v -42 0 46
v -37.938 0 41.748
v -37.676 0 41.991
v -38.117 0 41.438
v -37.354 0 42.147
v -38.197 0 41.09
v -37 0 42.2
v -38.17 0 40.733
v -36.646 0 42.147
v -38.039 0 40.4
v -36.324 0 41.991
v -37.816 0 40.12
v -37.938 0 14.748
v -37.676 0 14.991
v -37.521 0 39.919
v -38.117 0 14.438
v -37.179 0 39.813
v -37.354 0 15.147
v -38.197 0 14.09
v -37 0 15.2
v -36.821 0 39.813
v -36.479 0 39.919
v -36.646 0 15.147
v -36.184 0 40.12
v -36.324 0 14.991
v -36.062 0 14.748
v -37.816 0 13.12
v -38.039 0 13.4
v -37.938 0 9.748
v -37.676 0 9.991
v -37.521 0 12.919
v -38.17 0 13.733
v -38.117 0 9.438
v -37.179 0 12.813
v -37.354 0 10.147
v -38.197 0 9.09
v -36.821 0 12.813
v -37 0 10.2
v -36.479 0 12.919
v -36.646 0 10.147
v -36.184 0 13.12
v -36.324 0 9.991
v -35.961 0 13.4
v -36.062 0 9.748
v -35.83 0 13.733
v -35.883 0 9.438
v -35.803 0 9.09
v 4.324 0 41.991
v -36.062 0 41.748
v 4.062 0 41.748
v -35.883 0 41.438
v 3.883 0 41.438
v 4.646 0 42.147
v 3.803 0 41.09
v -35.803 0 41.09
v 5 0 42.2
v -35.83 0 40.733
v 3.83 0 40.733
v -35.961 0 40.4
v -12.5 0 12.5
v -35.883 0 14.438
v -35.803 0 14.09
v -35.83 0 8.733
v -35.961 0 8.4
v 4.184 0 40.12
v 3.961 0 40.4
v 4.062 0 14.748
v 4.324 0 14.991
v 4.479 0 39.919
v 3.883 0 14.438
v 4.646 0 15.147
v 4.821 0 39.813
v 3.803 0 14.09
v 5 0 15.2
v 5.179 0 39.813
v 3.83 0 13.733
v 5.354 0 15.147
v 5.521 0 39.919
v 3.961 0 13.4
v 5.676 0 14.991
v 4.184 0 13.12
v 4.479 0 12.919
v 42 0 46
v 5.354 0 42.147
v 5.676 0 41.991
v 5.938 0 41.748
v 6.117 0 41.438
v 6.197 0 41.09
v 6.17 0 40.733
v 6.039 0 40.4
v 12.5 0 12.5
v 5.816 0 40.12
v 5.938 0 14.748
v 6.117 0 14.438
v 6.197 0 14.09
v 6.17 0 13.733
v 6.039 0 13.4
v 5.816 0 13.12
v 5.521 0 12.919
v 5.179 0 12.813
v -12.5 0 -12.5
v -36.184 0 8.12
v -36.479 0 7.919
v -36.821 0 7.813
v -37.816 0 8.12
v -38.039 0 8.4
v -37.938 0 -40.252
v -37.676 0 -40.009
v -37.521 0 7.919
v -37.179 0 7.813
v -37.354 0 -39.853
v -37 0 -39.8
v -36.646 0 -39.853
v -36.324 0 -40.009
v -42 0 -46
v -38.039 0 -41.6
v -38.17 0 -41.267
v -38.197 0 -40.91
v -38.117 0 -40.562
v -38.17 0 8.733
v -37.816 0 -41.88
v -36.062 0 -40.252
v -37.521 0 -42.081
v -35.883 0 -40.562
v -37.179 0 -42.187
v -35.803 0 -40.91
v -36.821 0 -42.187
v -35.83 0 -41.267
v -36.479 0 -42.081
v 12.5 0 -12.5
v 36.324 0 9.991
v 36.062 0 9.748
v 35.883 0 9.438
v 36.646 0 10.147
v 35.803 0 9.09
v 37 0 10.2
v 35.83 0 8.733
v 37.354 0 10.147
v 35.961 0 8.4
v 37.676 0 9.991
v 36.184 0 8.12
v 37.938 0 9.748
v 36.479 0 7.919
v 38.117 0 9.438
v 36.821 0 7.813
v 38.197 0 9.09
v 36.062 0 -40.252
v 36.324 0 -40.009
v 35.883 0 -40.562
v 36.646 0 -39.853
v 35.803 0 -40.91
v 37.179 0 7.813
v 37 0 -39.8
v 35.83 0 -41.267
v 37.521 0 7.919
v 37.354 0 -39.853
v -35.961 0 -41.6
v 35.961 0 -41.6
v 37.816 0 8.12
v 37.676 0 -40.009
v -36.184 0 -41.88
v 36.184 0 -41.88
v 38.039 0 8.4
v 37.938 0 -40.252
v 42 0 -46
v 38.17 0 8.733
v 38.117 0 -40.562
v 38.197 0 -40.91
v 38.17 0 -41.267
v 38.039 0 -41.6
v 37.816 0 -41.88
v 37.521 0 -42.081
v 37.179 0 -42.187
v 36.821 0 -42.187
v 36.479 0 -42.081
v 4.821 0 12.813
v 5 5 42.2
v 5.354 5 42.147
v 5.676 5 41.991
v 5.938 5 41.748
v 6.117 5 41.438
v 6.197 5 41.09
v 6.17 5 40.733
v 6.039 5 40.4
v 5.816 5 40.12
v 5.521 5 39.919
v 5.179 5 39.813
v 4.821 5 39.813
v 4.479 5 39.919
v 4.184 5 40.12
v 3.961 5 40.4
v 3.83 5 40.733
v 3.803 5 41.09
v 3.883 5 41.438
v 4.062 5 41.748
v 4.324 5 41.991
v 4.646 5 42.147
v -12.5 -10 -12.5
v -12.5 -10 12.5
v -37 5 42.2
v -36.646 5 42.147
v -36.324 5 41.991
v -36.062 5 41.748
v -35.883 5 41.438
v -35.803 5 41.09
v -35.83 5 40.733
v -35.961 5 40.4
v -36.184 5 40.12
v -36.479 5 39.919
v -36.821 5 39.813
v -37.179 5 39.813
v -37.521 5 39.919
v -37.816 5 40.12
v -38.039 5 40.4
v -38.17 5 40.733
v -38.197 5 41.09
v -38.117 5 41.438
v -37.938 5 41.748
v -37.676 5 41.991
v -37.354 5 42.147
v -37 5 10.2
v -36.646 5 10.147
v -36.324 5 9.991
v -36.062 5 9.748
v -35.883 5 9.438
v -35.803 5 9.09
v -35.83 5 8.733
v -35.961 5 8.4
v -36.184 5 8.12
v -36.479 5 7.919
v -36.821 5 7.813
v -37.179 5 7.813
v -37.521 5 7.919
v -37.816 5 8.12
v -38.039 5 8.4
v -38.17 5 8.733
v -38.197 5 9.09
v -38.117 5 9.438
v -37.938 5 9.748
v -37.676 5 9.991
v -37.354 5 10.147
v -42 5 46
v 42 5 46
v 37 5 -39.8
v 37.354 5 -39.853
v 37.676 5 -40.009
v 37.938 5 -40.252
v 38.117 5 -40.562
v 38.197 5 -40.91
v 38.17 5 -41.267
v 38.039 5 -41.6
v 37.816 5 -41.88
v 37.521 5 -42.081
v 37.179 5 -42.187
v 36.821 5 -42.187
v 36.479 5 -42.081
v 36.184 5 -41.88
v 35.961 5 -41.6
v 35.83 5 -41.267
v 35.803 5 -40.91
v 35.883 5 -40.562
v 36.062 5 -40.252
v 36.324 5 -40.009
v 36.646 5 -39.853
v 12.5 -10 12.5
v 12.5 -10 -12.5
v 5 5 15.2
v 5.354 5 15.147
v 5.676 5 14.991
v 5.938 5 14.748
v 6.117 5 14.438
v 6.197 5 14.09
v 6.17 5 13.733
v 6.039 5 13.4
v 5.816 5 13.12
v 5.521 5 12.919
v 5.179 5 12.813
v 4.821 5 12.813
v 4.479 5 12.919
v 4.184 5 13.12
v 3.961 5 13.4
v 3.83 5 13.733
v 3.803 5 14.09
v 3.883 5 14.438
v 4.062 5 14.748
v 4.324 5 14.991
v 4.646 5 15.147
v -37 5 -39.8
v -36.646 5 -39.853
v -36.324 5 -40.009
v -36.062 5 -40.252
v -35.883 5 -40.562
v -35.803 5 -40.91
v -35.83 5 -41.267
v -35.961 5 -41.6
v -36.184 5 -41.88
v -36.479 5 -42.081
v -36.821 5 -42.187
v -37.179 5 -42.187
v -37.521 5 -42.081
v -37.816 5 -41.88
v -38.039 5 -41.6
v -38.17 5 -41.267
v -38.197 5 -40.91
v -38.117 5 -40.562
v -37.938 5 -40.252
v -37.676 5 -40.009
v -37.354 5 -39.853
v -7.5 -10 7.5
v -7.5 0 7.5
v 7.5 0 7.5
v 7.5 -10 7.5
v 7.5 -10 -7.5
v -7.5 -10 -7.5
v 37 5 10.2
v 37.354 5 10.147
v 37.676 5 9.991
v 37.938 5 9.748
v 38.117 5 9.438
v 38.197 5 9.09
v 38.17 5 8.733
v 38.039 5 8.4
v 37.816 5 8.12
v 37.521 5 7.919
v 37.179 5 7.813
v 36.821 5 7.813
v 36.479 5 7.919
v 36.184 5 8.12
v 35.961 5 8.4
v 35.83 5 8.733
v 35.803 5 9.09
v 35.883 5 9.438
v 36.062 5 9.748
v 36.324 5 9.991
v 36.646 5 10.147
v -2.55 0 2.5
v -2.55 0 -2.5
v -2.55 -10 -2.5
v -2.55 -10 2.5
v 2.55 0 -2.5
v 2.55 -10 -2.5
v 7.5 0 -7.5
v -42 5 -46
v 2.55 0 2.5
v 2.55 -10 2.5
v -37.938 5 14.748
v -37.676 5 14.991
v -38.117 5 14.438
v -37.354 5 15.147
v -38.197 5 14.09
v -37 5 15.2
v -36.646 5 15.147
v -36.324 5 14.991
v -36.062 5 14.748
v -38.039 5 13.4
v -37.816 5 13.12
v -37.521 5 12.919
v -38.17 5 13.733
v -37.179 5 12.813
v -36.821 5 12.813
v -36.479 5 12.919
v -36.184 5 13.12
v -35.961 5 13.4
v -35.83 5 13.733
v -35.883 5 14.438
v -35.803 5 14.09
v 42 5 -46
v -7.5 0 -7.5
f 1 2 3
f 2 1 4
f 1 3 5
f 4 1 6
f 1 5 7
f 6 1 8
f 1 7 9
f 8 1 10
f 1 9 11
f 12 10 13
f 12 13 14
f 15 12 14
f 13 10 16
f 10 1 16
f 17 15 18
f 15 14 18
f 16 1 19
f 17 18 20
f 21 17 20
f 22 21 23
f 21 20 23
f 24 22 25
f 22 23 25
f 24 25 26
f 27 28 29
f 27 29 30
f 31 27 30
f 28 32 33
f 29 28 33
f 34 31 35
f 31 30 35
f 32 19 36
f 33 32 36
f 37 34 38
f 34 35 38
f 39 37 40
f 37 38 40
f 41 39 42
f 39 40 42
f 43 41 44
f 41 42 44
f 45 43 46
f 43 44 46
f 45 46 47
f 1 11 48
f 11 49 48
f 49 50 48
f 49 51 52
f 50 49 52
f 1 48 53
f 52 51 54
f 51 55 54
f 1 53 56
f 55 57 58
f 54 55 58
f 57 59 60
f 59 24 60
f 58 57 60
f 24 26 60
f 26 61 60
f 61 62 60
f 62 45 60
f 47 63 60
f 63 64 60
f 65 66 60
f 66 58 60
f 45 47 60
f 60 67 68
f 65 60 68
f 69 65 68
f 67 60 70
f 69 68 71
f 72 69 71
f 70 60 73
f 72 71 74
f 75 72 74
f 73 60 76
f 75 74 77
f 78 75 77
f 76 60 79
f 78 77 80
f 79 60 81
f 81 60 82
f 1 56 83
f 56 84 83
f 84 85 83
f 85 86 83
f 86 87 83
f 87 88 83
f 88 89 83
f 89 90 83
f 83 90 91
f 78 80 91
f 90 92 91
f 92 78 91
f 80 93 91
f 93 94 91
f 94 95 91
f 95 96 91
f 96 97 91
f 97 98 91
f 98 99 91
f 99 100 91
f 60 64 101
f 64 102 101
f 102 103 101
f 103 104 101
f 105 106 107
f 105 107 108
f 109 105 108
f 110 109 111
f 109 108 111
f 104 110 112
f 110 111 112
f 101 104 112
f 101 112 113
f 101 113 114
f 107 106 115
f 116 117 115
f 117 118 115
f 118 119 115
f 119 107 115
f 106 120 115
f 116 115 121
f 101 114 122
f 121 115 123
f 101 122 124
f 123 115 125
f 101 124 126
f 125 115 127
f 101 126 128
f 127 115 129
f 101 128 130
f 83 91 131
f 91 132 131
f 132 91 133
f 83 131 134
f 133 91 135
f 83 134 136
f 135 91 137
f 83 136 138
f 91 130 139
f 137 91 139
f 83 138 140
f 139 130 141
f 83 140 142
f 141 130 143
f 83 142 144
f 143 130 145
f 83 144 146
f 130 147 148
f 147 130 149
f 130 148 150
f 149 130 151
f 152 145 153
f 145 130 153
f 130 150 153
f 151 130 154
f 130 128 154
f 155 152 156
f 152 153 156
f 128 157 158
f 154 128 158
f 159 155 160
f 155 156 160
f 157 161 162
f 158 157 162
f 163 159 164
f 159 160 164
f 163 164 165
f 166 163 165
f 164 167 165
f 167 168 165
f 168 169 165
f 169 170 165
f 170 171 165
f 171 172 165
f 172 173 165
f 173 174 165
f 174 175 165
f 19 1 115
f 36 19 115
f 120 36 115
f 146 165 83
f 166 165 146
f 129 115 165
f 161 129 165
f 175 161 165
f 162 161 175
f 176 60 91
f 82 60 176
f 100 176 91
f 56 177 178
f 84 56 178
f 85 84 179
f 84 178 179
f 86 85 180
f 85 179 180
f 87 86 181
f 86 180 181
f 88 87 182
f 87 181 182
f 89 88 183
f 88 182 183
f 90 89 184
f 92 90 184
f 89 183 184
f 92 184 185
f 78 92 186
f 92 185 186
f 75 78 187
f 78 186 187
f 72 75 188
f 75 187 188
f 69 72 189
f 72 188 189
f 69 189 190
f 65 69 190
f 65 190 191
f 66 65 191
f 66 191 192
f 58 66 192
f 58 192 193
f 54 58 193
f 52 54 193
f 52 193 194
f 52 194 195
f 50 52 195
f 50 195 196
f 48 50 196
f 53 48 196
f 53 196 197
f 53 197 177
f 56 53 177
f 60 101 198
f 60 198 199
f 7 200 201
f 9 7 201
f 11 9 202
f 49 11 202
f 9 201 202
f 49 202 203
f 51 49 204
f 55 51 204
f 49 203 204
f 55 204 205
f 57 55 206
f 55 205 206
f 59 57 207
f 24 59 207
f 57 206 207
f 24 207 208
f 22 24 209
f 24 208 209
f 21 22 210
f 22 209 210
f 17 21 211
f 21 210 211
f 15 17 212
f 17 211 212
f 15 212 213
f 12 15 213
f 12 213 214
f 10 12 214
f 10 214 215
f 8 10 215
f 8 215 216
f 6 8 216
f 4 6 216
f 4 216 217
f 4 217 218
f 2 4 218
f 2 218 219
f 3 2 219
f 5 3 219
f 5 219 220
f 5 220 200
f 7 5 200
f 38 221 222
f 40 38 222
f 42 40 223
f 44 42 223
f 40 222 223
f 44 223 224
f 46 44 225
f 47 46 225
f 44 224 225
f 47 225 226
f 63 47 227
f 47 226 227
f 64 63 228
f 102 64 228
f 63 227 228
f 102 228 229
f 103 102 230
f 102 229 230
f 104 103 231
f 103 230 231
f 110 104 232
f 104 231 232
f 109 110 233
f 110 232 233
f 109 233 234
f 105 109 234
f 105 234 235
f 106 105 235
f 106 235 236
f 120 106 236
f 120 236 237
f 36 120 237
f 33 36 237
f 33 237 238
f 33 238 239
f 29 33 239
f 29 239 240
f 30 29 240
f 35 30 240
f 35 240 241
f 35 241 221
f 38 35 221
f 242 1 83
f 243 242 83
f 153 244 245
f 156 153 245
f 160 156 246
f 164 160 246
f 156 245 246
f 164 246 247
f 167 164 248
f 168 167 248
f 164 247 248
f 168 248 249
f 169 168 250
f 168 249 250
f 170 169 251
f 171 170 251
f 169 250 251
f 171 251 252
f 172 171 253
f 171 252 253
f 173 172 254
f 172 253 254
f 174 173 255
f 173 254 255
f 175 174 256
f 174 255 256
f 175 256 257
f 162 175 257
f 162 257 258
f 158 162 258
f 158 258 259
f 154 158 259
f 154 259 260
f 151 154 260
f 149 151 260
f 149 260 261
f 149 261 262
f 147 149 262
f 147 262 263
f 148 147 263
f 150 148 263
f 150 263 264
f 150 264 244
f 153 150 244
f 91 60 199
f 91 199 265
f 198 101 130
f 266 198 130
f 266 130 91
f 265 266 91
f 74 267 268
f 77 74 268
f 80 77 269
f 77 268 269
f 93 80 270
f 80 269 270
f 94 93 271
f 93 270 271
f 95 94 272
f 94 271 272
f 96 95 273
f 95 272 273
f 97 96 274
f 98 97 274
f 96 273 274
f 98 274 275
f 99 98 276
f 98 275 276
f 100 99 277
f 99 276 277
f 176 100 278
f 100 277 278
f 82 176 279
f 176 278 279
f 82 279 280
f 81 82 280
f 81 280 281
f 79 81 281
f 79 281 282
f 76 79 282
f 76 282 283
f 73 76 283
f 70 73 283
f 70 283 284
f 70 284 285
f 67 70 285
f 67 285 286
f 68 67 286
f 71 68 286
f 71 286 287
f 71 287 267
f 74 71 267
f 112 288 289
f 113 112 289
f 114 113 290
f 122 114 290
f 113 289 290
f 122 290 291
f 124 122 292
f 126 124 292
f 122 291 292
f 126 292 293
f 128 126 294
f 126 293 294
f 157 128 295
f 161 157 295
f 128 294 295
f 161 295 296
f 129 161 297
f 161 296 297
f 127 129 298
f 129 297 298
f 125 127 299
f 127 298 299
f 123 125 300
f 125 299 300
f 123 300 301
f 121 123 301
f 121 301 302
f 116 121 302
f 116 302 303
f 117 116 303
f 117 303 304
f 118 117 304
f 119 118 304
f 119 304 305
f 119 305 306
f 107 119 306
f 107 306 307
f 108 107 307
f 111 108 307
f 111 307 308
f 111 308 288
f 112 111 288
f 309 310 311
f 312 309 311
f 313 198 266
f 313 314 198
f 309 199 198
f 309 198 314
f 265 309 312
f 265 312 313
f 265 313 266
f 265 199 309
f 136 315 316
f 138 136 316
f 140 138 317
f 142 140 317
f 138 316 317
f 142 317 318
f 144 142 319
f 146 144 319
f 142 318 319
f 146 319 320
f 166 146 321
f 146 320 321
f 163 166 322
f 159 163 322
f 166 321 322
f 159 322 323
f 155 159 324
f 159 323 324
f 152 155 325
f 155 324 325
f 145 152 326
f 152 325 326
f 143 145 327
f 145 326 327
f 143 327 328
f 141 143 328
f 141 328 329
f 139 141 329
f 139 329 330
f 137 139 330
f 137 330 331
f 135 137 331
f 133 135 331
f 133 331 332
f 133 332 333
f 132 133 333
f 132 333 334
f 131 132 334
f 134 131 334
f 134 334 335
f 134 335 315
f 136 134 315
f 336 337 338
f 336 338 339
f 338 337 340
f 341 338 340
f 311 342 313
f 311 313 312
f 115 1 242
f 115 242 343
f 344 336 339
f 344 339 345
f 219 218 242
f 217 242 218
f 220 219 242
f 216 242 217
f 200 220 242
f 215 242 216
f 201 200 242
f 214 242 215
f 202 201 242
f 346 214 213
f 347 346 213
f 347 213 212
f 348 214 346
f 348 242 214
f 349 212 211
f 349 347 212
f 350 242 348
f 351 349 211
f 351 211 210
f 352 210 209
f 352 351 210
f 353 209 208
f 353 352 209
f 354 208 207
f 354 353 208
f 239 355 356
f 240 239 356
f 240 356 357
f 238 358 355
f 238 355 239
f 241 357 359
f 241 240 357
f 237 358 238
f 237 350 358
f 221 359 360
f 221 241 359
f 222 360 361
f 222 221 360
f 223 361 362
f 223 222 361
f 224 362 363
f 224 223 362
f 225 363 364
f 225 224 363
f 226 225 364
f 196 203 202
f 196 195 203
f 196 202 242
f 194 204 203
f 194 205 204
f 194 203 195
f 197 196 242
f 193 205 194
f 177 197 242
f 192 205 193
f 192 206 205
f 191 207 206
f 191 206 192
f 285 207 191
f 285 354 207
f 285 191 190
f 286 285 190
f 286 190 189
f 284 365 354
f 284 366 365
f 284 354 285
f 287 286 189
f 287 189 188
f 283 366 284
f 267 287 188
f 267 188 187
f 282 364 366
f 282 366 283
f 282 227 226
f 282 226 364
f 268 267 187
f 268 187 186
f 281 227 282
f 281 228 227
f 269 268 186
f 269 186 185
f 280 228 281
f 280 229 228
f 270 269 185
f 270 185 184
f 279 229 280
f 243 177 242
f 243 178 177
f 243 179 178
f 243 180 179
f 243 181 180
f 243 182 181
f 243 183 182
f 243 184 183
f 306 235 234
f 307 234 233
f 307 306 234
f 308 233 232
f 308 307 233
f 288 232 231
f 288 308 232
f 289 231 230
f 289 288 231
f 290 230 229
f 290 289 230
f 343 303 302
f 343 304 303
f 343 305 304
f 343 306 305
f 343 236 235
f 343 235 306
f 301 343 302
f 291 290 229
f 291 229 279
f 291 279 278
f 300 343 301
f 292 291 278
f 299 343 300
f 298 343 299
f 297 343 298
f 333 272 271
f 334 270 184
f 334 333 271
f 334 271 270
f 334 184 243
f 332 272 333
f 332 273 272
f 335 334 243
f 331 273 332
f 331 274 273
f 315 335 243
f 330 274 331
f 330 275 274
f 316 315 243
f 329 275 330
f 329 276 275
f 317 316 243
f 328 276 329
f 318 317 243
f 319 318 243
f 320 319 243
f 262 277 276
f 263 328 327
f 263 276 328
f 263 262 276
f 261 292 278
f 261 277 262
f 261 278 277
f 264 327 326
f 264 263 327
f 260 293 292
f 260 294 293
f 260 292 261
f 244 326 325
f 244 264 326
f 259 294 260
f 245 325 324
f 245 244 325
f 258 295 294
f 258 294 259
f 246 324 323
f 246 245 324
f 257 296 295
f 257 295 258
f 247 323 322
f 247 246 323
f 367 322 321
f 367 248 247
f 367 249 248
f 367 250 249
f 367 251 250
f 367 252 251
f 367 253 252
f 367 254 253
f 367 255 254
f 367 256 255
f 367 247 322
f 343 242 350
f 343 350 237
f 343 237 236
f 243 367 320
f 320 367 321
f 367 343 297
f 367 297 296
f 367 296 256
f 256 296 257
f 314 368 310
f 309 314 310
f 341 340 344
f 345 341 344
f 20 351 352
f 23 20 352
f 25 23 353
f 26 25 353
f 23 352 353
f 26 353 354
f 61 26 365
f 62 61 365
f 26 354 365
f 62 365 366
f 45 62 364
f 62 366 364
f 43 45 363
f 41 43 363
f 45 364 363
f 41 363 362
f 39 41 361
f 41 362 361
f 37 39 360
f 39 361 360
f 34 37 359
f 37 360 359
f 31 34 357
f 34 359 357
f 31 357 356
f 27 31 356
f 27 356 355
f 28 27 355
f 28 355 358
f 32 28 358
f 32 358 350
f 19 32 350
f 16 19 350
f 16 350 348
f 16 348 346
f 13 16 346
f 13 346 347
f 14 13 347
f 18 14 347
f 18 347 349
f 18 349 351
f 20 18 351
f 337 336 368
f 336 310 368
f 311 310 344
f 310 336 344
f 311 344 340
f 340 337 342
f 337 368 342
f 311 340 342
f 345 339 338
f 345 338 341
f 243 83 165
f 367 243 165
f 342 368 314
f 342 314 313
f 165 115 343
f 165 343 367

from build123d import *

# Parameters (mm, degrees)
SKETCH_1_W          = 84
SKETCH_1_H          = 92
EXTRUDE_1_DEPTH     = 5
SKETCH_2_W          = 25
SKETCH_2_H          = 25
SKETCH_2_W_2        = 15
SKETCH_2_H_2        = 15
SKETCH_2_W_3        = 5.1
SKETCH_2_H_3        = 5
EXTRUDE_2_DEPTH     = 10
SKETCH_3_R          = 1.2
CUT_EXTRUDE_1_DEPTH = 10


with BuildPart() as part:
    # 草图1 → 凸台-拉伸1 (new body)
    with BuildSketch(Plane(origin=(0, 0, 0), x_dir=(1, 0, 0), z_dir=(0, 1, 0))):
        Rectangle(SKETCH_1_W, SKETCH_1_H)
    extrude(amount=EXTRUDE_1_DEPTH)

    # 草图2 → 凸台-拉伸2 (add)
    # profile 1 of 2: a face of its own
    with BuildSketch(Plane.XZ):
        Rectangle(SKETCH_2_W, SKETCH_2_H)
        Rectangle(SKETCH_2_W_2, SKETCH_2_H_2, mode=Mode.SUBTRACT)
    # profile 2 of 2: a face of its own
    with BuildSketch(Plane.XZ):
        Rectangle(SKETCH_2_W_3, SKETCH_2_H_3)
    extrude(amount=EXTRUDE_2_DEPTH)

    # 草图3 → 切除-拉伸1 (cut)
    with BuildSketch(Plane(origin=(0, 5, 0), x_dir=(1, 0, 0), z_dir=(0, 1, 0))):
        with Locations(Location((-37, -14, 0), (0, 0, 270))):
            Circle(SKETCH_3_R)
        with Locations(Location((5, -14, 0), (0, 0, 270))):
            Circle(SKETCH_3_R)
        with Locations(Location((-37, -41, 0), (0, 0, 270))):
            Circle(SKETCH_3_R)
        with Locations(Location((5, -41, 0), (0, 0, 270))):
            Circle(SKETCH_3_R)
        with Locations(Location((37, -9, 0), (0, 0, 270))):
            Circle(SKETCH_3_R)
        with Locations(Location((-37, -9, 0), (0, 0, 270))):
            Circle(SKETCH_3_R)
        with Locations(Location((-37, 41, 0), (0, 0, 270))):
            Circle(SKETCH_3_R)
        with Locations(Location((37, 41, 0), (0, 0, 270))):
            Circle(SKETCH_3_R)
    extrude(amount=-CUT_EXTRUDE_1_DEPTH, mode=Mode.SUBTRACT)


solid = part.part
